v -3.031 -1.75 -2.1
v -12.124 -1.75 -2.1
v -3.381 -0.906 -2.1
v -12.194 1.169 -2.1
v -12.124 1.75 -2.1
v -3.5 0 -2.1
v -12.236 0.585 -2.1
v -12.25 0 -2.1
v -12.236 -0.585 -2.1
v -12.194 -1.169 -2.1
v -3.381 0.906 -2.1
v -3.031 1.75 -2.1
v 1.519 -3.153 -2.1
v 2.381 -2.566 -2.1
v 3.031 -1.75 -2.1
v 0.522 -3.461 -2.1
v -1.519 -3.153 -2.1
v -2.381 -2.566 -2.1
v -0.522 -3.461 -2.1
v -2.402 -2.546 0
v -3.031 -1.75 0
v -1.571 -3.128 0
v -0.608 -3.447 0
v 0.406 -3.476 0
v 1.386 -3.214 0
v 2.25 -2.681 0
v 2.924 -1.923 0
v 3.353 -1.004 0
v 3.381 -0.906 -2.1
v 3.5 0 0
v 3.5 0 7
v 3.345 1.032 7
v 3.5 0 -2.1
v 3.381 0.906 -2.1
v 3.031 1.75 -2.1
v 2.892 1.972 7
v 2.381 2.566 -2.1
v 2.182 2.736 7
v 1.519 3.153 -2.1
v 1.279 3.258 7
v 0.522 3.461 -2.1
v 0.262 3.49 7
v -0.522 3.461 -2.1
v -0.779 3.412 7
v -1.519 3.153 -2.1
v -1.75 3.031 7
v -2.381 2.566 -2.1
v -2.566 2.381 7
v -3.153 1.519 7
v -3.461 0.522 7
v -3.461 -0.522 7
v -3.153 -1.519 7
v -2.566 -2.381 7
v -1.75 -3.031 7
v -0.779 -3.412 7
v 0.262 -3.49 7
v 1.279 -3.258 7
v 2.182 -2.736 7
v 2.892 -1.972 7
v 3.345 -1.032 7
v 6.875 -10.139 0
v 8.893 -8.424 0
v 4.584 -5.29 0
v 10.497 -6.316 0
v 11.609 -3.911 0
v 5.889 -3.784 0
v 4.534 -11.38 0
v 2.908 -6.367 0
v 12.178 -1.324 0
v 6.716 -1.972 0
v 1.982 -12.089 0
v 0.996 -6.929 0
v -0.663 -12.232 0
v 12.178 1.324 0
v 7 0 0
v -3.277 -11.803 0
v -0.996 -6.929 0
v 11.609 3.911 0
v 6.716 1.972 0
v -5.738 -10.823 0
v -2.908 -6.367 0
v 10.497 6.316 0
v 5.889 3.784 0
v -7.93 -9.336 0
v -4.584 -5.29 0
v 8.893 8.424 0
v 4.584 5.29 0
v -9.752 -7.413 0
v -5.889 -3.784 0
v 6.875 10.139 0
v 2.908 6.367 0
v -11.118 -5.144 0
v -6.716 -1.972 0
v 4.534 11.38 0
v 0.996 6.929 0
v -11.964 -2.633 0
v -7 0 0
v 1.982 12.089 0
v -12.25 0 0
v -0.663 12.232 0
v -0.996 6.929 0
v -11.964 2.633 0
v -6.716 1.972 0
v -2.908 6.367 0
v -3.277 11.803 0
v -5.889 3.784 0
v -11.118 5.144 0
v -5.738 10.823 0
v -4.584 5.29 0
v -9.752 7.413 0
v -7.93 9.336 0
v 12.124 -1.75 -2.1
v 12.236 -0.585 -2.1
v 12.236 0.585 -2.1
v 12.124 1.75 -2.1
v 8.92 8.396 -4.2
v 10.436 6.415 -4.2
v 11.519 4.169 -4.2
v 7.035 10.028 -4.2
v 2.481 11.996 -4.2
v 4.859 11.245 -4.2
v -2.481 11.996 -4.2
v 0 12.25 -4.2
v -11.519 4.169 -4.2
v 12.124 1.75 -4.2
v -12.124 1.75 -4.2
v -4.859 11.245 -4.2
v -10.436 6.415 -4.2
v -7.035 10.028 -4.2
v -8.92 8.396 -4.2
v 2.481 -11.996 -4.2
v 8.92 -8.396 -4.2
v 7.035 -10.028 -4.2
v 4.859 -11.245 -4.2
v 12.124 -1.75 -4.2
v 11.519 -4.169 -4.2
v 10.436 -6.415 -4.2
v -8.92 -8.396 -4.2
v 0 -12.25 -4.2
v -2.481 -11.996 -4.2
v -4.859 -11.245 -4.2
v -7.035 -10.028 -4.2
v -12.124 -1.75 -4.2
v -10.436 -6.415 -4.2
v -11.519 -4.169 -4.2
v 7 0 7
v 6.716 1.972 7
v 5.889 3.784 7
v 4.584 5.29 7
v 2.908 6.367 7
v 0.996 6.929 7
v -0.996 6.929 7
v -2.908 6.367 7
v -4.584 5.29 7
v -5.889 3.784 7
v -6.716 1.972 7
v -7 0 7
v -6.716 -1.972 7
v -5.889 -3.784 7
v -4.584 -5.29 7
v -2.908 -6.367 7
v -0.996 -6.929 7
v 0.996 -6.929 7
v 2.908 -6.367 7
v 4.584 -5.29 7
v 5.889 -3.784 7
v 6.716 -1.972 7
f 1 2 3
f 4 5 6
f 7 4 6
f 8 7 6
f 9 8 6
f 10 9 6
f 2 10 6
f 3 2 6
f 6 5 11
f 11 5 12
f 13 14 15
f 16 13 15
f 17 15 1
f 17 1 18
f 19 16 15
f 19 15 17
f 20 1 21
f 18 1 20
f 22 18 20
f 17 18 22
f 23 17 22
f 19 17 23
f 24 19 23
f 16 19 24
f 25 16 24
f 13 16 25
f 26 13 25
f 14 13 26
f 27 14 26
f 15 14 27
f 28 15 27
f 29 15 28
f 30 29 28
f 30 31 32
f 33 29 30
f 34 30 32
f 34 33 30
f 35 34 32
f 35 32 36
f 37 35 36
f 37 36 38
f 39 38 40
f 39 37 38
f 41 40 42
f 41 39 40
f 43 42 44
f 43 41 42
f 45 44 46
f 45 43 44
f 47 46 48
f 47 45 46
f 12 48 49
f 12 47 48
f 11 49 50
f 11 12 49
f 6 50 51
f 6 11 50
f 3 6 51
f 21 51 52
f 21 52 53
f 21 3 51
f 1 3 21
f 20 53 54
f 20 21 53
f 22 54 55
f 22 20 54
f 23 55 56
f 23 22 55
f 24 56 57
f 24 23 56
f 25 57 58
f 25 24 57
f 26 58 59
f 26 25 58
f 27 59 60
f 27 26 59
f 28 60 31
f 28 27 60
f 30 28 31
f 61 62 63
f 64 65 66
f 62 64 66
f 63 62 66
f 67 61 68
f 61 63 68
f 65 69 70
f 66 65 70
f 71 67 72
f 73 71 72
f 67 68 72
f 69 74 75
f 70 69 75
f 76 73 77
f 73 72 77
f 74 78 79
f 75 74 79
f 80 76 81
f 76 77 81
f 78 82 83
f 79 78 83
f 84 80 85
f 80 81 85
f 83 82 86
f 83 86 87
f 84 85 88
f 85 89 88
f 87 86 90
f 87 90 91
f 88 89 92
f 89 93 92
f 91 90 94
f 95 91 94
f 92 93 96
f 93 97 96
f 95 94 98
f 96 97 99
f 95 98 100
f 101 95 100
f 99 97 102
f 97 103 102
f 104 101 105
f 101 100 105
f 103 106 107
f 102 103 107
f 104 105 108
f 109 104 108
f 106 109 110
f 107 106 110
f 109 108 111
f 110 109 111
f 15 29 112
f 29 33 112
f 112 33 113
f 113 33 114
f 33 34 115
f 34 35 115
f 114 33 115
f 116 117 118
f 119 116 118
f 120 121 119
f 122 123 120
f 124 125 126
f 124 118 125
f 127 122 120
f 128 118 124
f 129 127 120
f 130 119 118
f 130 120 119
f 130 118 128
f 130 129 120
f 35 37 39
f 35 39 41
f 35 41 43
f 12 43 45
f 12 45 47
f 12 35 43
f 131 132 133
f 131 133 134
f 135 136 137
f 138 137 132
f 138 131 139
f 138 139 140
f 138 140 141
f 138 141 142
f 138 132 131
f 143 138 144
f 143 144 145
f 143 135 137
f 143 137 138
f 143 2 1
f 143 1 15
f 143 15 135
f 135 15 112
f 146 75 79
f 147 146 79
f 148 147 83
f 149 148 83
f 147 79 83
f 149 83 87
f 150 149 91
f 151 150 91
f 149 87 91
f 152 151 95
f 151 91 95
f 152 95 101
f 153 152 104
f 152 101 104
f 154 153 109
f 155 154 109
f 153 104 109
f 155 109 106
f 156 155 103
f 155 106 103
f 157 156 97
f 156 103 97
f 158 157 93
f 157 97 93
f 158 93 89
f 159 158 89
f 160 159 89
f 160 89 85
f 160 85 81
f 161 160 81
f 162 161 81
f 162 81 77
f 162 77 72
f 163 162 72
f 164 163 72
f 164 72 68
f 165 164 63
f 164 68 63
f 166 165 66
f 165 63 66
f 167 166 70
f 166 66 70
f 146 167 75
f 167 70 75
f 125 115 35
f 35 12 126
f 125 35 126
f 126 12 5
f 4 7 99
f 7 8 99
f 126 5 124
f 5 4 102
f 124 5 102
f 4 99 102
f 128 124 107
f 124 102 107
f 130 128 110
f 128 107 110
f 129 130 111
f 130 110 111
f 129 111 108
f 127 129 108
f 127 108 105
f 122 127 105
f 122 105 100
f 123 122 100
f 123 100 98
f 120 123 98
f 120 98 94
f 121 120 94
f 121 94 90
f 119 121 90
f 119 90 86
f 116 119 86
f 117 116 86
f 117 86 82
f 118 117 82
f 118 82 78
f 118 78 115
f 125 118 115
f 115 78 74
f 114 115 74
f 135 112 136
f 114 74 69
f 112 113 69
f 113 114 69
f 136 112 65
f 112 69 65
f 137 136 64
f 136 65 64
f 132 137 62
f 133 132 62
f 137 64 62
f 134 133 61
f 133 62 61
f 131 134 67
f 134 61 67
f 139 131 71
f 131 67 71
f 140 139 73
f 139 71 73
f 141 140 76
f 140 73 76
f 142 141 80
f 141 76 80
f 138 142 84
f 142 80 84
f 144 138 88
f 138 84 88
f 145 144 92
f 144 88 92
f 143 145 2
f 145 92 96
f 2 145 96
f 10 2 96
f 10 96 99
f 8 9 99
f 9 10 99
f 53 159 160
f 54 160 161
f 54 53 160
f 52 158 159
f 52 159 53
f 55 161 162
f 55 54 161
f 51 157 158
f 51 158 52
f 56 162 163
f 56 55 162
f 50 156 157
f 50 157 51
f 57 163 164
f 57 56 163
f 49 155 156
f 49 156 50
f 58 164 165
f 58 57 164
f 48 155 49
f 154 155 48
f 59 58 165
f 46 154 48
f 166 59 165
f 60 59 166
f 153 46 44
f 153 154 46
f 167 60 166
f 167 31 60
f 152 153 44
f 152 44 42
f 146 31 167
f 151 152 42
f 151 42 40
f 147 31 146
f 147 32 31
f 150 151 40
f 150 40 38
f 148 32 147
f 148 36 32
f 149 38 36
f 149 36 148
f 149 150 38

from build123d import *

# Parameters (mm, degrees)
SKETCH1_R           = 7
SKETCH1_R_2         = 3.5
BOSS_EXTRUDE1_DEPTH = 7
SKETCH2_R           = 12.25
BOSS_EXTRUDE2_DEPTH = 4.2
CUT_EXTRUDE1_START  = -2.1
CUT_EXTRUDE1_DEPTH  = 2.1
CUT_EXTRUDE2_START  = -2.1
SKETCH4_R           = 3.5
CUT_EXTRUDE2_DEPTH  = 2.1


with BuildPart() as part:
    # Sketch1 → Boss-Extrude1 (new body)
    with BuildSketch(Plane.XY):
        Circle(SKETCH1_R)
        Circle(SKETCH1_R_2, mode=Mode.SUBTRACT)
    extrude(amount=BOSS_EXTRUDE1_DEPTH)

    # Sketch2 → Boss-Extrude2 (add)
    with BuildSketch(Plane(origin=(0, 0, 0), x_dir=(-1, 0, 0), z_dir=(0, 0, -1))):
        Circle(SKETCH2_R)
    extrude(amount=BOSS_EXTRUDE2_DEPTH)

    # Sketch3 → Cut-Extrude1 (cut)
    with BuildSketch(Plane(origin=(0, 0, -4.2), x_dir=(-1, 0, 0), z_dir=(0, 0, -1)).offset(CUT_EXTRUDE1_START)):
        with BuildLine():
            Line((-12.124355653, 1.75), (12.124355653, 1.75))
            ThreePointArc((12.124355653, 1.75), (12.25, 0), (12.124355653, -1.75))
            Line((12.124355653, -1.75), (-12.124355653, -1.75))
            ThreePointArc((-12.124355653, -1.75), (-12.25, 0), (-12.124355653, 1.75))
        make_face()
    extrude(amount=CUT_EXTRUDE1_DEPTH, mode=Mode.SUBTRACT)

    # Sketch4 → Cut-Extrude2 (cut)
    with BuildSketch(Plane.XY.offset(CUT_EXTRUDE2_START)):
        with Locations(Location((0, 0, 0), (0, 0, 210))):
            Circle(SKETCH4_R)
    extrude(amount=CUT_EXTRUDE2_DEPTH, mode=Mode.SUBTRACT)


solid = part.part
